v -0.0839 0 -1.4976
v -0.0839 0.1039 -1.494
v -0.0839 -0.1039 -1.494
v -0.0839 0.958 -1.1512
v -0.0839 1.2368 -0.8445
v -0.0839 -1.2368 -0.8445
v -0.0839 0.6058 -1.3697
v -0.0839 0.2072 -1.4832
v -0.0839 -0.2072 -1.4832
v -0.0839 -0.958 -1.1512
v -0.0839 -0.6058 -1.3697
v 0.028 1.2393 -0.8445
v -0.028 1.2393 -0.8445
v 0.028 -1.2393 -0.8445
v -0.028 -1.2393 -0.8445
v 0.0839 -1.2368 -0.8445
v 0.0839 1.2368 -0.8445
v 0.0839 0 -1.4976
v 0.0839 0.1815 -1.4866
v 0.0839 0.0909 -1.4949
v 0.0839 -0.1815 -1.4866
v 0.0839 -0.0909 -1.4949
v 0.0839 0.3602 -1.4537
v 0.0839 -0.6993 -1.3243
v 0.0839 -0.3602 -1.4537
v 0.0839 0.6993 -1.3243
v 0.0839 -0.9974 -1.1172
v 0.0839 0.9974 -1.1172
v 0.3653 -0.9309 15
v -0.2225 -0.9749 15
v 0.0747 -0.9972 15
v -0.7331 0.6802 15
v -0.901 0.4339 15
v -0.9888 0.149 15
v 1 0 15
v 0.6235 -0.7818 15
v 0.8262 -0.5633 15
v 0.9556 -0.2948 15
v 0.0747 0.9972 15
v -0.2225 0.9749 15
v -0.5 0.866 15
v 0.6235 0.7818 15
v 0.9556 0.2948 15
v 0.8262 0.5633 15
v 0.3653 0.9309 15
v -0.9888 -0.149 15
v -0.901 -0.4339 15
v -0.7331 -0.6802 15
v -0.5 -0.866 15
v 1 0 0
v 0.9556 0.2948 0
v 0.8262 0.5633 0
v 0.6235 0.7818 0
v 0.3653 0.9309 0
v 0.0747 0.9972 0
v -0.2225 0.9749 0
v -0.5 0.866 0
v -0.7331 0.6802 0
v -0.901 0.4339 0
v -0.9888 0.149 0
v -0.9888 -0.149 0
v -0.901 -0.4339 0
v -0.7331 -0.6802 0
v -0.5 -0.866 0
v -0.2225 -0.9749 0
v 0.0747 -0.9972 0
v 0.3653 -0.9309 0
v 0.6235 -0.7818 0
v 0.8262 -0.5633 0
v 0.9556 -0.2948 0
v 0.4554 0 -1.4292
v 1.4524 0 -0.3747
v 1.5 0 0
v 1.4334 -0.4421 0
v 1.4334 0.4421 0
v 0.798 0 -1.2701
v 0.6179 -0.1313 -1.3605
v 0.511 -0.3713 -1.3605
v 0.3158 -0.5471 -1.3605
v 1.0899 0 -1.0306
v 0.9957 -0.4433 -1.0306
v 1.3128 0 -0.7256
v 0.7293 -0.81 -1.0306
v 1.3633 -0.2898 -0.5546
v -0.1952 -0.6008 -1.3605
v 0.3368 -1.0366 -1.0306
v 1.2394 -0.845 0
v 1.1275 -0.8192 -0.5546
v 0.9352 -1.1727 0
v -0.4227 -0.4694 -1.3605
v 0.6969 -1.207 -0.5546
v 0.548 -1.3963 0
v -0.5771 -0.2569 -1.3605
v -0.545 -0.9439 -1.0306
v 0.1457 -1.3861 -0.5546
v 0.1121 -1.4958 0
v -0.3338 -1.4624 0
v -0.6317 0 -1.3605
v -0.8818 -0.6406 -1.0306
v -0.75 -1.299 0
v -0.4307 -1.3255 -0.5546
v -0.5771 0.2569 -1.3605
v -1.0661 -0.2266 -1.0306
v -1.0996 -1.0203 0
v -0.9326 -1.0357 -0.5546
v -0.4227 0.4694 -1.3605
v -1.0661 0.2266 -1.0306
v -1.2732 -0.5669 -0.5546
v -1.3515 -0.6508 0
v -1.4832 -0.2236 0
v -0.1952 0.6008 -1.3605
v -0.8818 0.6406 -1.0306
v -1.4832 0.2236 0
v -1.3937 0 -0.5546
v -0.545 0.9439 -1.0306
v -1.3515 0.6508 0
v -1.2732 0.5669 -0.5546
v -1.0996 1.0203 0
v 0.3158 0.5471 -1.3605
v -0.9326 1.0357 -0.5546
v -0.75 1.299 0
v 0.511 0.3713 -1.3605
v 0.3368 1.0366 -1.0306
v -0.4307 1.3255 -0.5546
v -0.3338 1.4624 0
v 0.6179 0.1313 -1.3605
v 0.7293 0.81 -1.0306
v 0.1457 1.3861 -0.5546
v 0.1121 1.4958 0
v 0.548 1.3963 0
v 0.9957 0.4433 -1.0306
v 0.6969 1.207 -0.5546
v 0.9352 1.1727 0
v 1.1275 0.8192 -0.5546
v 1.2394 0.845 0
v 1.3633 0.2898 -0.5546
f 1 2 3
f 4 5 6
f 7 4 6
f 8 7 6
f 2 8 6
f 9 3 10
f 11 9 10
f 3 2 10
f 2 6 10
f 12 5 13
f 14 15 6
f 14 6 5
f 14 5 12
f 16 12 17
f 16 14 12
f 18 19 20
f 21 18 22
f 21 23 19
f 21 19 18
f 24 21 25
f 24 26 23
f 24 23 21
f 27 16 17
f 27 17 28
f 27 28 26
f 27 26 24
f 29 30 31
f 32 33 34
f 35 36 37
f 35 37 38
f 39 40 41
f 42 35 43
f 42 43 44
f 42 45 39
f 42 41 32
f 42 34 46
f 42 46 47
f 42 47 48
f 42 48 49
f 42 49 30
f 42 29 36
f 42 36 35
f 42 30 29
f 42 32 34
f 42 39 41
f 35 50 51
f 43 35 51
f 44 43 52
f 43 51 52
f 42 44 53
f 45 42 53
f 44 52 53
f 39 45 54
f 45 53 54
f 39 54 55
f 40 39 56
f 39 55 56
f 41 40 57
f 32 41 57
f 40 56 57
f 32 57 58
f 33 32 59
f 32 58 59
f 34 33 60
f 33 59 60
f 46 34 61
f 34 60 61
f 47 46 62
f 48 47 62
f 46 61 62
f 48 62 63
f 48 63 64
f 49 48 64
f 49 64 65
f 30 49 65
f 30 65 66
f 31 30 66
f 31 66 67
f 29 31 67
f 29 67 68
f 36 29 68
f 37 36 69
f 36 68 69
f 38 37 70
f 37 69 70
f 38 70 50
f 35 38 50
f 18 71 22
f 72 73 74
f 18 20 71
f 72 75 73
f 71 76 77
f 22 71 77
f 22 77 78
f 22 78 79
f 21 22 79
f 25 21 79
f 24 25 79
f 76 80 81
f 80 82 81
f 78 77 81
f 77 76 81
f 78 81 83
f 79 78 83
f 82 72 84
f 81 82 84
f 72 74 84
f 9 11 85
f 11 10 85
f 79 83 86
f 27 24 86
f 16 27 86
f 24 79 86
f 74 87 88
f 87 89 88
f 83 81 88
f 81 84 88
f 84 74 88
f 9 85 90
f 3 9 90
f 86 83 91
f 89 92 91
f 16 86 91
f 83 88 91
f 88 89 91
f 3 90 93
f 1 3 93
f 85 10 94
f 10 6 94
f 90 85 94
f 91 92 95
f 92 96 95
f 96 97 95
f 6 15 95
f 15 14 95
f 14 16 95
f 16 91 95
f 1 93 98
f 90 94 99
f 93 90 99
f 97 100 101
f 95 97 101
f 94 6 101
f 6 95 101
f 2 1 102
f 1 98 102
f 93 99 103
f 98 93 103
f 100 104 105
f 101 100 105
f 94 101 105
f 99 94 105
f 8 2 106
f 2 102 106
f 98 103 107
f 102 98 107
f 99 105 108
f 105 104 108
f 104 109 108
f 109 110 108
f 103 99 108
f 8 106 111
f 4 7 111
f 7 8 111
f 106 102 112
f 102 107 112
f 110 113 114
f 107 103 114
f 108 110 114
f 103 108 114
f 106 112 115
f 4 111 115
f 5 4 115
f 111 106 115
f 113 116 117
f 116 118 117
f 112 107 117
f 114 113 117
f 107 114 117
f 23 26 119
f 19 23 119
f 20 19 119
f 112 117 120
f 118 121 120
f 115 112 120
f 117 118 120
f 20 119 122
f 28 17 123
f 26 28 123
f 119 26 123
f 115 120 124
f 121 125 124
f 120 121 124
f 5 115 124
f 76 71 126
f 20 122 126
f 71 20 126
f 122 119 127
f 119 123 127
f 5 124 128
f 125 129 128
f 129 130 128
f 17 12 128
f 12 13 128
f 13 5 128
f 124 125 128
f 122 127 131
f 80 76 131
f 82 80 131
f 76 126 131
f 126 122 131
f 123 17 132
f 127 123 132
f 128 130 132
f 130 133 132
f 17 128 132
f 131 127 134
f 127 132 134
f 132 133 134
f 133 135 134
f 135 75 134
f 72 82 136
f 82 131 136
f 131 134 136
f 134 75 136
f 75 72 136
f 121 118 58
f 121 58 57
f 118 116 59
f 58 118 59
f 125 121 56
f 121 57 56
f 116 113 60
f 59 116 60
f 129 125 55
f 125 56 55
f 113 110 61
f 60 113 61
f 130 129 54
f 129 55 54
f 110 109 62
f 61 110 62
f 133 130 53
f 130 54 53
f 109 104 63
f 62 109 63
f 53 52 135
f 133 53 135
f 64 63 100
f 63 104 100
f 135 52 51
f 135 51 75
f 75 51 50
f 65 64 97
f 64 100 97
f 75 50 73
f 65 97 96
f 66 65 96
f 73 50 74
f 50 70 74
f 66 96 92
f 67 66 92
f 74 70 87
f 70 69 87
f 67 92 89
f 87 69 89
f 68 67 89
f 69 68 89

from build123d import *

# Parameters (mm, degrees)
ESQUISSE1_R                  = 1
BOSS_EXTRU_1_DEPTH           = 15
ENL_V_MAT_EXTRU_1_DEPTH      = 10
ENL_V_MAT_EXTRU_1_DEPTH_BACK = 10
ESQUISSE4_W                  = 0.167865562
ESQUISSE4_H                  = 1.310923544


with BuildPart() as part:
    # Esquisse1 → Boss.-Extru.1 (new body)
    with BuildSketch(Plane.XY):
        Circle(ESQUISSE1_R)
    extrude(amount=BOSS_EXTRU_1_DEPTH)

    # Esquisse2 → Révolution1 (revolve)
    with BuildSketch(Plane(origin=(0, 0, 0), x_dir=(1, 0, 0), z_dir=(0, 1, 0))):
        with BuildLine():
            Line((0, 0), (0, 1.5))
            ThreePointArc((0, 1.5), (1.060660172, 1.060660172), (1.5, 0))
            Line((1.5, 0), (0, 0))
        make_face()
    revolve(axis=Axis((0, 0, 0), (0, 0, -1)))

    # Esquisse4 → Enlèv. mat.-Extru.1 (cut, two sides: drawn at the far end of the back side and taken through both)
    with BuildSketch(Plane(origin=(0, 0, 0), x_dir=(1, 0, 0), z_dir=(0, 1, 0)).offset(-ENL_V_MAT_EXTRU_1_DEPTH_BACK)):
        with Locations((0, 1.5)):
            Rectangle(ESQUISSE4_W, ESQUISSE4_H)
    extrude(amount=ENL_V_MAT_EXTRU_1_DEPTH + ENL_V_MAT_EXTRU_1_DEPTH_BACK, mode=Mode.SUBTRACT)


solid = part.part
